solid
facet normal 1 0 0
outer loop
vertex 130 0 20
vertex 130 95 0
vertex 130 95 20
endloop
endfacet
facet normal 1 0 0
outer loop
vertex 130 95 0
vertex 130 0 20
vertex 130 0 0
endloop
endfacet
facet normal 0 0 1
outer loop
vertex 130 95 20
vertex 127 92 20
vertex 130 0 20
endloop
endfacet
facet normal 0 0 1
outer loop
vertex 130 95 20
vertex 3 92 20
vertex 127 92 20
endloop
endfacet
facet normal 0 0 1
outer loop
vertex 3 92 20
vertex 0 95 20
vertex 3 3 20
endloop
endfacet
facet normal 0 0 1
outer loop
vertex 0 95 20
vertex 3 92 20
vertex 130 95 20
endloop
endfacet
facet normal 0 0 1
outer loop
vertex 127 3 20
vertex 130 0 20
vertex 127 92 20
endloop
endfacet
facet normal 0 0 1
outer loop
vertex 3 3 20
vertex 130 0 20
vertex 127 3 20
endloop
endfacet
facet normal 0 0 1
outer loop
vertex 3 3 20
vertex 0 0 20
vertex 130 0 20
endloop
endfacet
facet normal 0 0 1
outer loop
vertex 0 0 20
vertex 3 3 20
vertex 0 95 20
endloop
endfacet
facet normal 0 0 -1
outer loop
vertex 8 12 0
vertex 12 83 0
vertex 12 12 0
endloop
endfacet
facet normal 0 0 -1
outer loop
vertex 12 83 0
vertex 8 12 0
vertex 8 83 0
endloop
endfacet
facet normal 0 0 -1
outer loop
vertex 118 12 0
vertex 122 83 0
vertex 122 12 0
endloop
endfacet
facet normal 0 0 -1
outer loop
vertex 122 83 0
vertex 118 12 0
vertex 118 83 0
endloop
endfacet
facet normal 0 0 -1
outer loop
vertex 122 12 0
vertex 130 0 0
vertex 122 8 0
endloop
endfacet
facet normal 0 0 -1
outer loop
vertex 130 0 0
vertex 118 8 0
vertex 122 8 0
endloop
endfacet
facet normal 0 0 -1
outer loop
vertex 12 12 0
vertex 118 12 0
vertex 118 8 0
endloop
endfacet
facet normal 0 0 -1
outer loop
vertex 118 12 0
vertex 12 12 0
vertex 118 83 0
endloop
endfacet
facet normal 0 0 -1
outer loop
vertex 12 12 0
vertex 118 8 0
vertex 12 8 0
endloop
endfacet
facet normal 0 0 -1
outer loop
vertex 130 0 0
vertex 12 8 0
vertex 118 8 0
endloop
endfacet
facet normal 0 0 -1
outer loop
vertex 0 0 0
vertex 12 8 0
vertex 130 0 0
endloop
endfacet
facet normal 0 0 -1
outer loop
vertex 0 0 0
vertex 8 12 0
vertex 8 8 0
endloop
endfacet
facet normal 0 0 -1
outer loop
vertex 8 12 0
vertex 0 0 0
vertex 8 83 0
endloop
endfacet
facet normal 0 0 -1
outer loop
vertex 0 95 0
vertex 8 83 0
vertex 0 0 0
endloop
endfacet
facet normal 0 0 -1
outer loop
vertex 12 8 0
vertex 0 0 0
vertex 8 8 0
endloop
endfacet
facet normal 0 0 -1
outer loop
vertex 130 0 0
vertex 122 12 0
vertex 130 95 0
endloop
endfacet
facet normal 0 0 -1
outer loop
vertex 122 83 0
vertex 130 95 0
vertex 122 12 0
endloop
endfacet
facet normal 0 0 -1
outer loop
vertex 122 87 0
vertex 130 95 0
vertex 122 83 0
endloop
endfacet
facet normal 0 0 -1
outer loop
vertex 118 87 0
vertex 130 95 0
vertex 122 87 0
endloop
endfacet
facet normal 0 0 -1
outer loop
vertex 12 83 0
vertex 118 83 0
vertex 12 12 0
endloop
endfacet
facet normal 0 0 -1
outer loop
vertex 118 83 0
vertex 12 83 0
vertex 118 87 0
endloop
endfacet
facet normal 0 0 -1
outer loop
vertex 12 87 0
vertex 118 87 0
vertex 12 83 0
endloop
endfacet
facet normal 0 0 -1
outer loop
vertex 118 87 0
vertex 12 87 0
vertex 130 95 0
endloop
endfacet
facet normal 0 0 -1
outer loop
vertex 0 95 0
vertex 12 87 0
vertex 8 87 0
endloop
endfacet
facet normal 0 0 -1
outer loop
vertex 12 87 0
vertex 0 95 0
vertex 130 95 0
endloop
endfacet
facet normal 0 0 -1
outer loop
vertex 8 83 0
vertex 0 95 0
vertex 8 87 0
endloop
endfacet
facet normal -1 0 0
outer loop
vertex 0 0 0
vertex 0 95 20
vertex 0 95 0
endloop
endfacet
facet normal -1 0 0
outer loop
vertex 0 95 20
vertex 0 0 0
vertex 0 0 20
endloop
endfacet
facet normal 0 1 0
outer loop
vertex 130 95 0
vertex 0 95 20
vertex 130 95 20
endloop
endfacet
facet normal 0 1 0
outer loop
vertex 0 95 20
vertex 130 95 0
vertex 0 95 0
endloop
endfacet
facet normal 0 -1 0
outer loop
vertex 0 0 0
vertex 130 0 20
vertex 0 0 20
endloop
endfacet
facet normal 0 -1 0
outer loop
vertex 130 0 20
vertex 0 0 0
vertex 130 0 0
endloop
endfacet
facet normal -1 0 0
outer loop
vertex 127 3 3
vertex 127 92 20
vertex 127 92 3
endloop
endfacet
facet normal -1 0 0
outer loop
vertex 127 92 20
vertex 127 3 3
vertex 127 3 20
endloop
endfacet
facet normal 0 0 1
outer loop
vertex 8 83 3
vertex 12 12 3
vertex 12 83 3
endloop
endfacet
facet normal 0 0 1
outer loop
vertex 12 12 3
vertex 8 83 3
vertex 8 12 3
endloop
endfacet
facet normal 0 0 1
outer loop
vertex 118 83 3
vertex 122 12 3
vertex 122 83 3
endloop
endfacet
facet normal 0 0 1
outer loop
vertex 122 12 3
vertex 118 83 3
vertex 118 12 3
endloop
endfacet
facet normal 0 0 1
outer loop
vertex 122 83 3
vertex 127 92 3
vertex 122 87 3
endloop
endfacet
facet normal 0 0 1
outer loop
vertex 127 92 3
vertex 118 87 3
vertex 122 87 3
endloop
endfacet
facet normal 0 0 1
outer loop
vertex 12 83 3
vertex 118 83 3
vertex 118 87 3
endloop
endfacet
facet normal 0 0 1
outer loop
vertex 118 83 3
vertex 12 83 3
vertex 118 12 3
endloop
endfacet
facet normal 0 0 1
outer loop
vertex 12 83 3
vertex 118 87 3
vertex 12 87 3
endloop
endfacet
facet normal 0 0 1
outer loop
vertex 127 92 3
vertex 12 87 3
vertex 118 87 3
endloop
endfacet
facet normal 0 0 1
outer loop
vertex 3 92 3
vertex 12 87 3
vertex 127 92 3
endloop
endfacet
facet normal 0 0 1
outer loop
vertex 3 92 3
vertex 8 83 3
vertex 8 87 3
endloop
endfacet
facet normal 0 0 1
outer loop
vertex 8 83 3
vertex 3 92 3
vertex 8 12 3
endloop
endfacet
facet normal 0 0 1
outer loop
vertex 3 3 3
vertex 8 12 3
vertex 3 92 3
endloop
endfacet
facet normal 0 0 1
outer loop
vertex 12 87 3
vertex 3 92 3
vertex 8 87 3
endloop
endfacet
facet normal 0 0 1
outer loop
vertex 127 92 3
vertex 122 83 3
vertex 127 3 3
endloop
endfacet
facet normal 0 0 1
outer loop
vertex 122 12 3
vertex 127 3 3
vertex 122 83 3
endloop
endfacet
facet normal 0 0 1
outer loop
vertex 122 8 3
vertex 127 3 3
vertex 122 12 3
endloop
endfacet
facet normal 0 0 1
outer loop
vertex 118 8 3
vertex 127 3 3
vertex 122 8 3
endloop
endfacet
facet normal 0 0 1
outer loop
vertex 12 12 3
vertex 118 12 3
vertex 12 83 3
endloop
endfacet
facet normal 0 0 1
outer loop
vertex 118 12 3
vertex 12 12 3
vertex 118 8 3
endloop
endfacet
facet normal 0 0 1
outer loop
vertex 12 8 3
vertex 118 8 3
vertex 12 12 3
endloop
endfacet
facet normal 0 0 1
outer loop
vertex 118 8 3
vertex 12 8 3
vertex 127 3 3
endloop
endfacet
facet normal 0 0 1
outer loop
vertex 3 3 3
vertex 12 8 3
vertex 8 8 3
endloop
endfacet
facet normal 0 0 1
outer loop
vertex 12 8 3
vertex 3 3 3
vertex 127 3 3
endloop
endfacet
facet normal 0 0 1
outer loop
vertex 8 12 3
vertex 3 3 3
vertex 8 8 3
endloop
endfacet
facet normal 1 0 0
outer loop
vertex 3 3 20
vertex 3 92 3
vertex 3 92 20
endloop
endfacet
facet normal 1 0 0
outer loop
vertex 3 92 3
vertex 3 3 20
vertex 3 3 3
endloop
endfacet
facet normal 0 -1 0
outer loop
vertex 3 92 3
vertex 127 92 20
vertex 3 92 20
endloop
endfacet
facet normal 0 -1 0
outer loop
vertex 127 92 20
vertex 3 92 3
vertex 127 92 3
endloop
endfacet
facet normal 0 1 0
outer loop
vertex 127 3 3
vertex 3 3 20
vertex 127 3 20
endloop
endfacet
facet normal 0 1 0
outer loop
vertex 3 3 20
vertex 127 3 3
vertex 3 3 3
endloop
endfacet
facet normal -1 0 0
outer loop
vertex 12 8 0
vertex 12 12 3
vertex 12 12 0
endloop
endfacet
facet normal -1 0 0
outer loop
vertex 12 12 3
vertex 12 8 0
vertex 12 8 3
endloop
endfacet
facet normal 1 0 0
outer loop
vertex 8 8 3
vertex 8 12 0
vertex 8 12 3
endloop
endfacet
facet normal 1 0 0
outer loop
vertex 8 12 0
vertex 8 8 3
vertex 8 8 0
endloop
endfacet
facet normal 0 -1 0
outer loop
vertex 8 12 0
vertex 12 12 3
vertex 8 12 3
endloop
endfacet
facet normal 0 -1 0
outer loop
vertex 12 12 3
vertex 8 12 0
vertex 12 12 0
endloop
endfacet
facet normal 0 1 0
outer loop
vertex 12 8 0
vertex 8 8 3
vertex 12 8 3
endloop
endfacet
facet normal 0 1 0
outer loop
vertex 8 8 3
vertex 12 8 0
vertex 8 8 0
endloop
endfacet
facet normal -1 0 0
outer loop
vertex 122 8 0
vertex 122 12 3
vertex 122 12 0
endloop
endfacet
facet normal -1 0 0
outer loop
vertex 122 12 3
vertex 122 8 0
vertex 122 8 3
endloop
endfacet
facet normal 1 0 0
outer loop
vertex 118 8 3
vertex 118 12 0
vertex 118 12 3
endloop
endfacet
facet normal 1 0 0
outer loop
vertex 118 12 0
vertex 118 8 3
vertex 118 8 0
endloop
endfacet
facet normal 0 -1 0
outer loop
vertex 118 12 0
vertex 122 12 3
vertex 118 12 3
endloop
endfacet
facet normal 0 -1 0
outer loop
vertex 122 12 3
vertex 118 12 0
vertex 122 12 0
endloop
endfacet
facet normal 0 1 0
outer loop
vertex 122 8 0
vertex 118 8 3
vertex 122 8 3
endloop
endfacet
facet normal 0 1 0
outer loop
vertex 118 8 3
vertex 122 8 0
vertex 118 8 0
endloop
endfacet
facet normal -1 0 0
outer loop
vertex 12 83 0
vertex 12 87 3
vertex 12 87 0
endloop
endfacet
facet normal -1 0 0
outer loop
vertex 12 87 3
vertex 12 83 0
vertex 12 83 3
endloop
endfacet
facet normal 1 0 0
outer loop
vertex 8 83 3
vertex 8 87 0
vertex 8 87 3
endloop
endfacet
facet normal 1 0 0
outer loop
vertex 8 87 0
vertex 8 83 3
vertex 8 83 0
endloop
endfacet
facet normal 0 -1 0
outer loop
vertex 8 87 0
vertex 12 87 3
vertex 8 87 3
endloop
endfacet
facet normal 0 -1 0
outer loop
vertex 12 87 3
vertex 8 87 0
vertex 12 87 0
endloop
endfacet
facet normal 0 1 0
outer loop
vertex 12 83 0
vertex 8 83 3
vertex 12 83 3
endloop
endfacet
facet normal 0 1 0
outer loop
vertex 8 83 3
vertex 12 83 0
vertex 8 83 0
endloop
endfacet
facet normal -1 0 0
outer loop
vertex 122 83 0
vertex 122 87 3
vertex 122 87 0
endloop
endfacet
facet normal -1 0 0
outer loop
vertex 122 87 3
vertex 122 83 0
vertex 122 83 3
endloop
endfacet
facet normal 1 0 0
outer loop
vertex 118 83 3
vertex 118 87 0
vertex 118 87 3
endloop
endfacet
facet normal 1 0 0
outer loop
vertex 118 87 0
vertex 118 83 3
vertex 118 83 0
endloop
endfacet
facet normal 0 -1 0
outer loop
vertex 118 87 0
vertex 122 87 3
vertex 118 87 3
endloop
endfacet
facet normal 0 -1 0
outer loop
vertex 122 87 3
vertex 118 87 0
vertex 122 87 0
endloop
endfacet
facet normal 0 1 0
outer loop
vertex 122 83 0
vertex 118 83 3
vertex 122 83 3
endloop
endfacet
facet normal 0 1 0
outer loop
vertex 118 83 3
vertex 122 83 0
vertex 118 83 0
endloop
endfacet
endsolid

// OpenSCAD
// TEMPLATE ONLY. Measure and edit before printing. Millimetres.
difference(){union(){
translate([0, 0, 0]) cube([130, 95, 20]);
}
translate([3, 3, 3]) cube([124, 89, 18]);
translate([8, 8, -1]) cube([4, 4, 4.1]);
translate([118, 8, -1]) cube([4, 4, 4.1]);
translate([8, 83, -1]) cube([4, 4, 4.1]);
translate([118, 83, -1]) cube([4, 4, 4.1]);
}
